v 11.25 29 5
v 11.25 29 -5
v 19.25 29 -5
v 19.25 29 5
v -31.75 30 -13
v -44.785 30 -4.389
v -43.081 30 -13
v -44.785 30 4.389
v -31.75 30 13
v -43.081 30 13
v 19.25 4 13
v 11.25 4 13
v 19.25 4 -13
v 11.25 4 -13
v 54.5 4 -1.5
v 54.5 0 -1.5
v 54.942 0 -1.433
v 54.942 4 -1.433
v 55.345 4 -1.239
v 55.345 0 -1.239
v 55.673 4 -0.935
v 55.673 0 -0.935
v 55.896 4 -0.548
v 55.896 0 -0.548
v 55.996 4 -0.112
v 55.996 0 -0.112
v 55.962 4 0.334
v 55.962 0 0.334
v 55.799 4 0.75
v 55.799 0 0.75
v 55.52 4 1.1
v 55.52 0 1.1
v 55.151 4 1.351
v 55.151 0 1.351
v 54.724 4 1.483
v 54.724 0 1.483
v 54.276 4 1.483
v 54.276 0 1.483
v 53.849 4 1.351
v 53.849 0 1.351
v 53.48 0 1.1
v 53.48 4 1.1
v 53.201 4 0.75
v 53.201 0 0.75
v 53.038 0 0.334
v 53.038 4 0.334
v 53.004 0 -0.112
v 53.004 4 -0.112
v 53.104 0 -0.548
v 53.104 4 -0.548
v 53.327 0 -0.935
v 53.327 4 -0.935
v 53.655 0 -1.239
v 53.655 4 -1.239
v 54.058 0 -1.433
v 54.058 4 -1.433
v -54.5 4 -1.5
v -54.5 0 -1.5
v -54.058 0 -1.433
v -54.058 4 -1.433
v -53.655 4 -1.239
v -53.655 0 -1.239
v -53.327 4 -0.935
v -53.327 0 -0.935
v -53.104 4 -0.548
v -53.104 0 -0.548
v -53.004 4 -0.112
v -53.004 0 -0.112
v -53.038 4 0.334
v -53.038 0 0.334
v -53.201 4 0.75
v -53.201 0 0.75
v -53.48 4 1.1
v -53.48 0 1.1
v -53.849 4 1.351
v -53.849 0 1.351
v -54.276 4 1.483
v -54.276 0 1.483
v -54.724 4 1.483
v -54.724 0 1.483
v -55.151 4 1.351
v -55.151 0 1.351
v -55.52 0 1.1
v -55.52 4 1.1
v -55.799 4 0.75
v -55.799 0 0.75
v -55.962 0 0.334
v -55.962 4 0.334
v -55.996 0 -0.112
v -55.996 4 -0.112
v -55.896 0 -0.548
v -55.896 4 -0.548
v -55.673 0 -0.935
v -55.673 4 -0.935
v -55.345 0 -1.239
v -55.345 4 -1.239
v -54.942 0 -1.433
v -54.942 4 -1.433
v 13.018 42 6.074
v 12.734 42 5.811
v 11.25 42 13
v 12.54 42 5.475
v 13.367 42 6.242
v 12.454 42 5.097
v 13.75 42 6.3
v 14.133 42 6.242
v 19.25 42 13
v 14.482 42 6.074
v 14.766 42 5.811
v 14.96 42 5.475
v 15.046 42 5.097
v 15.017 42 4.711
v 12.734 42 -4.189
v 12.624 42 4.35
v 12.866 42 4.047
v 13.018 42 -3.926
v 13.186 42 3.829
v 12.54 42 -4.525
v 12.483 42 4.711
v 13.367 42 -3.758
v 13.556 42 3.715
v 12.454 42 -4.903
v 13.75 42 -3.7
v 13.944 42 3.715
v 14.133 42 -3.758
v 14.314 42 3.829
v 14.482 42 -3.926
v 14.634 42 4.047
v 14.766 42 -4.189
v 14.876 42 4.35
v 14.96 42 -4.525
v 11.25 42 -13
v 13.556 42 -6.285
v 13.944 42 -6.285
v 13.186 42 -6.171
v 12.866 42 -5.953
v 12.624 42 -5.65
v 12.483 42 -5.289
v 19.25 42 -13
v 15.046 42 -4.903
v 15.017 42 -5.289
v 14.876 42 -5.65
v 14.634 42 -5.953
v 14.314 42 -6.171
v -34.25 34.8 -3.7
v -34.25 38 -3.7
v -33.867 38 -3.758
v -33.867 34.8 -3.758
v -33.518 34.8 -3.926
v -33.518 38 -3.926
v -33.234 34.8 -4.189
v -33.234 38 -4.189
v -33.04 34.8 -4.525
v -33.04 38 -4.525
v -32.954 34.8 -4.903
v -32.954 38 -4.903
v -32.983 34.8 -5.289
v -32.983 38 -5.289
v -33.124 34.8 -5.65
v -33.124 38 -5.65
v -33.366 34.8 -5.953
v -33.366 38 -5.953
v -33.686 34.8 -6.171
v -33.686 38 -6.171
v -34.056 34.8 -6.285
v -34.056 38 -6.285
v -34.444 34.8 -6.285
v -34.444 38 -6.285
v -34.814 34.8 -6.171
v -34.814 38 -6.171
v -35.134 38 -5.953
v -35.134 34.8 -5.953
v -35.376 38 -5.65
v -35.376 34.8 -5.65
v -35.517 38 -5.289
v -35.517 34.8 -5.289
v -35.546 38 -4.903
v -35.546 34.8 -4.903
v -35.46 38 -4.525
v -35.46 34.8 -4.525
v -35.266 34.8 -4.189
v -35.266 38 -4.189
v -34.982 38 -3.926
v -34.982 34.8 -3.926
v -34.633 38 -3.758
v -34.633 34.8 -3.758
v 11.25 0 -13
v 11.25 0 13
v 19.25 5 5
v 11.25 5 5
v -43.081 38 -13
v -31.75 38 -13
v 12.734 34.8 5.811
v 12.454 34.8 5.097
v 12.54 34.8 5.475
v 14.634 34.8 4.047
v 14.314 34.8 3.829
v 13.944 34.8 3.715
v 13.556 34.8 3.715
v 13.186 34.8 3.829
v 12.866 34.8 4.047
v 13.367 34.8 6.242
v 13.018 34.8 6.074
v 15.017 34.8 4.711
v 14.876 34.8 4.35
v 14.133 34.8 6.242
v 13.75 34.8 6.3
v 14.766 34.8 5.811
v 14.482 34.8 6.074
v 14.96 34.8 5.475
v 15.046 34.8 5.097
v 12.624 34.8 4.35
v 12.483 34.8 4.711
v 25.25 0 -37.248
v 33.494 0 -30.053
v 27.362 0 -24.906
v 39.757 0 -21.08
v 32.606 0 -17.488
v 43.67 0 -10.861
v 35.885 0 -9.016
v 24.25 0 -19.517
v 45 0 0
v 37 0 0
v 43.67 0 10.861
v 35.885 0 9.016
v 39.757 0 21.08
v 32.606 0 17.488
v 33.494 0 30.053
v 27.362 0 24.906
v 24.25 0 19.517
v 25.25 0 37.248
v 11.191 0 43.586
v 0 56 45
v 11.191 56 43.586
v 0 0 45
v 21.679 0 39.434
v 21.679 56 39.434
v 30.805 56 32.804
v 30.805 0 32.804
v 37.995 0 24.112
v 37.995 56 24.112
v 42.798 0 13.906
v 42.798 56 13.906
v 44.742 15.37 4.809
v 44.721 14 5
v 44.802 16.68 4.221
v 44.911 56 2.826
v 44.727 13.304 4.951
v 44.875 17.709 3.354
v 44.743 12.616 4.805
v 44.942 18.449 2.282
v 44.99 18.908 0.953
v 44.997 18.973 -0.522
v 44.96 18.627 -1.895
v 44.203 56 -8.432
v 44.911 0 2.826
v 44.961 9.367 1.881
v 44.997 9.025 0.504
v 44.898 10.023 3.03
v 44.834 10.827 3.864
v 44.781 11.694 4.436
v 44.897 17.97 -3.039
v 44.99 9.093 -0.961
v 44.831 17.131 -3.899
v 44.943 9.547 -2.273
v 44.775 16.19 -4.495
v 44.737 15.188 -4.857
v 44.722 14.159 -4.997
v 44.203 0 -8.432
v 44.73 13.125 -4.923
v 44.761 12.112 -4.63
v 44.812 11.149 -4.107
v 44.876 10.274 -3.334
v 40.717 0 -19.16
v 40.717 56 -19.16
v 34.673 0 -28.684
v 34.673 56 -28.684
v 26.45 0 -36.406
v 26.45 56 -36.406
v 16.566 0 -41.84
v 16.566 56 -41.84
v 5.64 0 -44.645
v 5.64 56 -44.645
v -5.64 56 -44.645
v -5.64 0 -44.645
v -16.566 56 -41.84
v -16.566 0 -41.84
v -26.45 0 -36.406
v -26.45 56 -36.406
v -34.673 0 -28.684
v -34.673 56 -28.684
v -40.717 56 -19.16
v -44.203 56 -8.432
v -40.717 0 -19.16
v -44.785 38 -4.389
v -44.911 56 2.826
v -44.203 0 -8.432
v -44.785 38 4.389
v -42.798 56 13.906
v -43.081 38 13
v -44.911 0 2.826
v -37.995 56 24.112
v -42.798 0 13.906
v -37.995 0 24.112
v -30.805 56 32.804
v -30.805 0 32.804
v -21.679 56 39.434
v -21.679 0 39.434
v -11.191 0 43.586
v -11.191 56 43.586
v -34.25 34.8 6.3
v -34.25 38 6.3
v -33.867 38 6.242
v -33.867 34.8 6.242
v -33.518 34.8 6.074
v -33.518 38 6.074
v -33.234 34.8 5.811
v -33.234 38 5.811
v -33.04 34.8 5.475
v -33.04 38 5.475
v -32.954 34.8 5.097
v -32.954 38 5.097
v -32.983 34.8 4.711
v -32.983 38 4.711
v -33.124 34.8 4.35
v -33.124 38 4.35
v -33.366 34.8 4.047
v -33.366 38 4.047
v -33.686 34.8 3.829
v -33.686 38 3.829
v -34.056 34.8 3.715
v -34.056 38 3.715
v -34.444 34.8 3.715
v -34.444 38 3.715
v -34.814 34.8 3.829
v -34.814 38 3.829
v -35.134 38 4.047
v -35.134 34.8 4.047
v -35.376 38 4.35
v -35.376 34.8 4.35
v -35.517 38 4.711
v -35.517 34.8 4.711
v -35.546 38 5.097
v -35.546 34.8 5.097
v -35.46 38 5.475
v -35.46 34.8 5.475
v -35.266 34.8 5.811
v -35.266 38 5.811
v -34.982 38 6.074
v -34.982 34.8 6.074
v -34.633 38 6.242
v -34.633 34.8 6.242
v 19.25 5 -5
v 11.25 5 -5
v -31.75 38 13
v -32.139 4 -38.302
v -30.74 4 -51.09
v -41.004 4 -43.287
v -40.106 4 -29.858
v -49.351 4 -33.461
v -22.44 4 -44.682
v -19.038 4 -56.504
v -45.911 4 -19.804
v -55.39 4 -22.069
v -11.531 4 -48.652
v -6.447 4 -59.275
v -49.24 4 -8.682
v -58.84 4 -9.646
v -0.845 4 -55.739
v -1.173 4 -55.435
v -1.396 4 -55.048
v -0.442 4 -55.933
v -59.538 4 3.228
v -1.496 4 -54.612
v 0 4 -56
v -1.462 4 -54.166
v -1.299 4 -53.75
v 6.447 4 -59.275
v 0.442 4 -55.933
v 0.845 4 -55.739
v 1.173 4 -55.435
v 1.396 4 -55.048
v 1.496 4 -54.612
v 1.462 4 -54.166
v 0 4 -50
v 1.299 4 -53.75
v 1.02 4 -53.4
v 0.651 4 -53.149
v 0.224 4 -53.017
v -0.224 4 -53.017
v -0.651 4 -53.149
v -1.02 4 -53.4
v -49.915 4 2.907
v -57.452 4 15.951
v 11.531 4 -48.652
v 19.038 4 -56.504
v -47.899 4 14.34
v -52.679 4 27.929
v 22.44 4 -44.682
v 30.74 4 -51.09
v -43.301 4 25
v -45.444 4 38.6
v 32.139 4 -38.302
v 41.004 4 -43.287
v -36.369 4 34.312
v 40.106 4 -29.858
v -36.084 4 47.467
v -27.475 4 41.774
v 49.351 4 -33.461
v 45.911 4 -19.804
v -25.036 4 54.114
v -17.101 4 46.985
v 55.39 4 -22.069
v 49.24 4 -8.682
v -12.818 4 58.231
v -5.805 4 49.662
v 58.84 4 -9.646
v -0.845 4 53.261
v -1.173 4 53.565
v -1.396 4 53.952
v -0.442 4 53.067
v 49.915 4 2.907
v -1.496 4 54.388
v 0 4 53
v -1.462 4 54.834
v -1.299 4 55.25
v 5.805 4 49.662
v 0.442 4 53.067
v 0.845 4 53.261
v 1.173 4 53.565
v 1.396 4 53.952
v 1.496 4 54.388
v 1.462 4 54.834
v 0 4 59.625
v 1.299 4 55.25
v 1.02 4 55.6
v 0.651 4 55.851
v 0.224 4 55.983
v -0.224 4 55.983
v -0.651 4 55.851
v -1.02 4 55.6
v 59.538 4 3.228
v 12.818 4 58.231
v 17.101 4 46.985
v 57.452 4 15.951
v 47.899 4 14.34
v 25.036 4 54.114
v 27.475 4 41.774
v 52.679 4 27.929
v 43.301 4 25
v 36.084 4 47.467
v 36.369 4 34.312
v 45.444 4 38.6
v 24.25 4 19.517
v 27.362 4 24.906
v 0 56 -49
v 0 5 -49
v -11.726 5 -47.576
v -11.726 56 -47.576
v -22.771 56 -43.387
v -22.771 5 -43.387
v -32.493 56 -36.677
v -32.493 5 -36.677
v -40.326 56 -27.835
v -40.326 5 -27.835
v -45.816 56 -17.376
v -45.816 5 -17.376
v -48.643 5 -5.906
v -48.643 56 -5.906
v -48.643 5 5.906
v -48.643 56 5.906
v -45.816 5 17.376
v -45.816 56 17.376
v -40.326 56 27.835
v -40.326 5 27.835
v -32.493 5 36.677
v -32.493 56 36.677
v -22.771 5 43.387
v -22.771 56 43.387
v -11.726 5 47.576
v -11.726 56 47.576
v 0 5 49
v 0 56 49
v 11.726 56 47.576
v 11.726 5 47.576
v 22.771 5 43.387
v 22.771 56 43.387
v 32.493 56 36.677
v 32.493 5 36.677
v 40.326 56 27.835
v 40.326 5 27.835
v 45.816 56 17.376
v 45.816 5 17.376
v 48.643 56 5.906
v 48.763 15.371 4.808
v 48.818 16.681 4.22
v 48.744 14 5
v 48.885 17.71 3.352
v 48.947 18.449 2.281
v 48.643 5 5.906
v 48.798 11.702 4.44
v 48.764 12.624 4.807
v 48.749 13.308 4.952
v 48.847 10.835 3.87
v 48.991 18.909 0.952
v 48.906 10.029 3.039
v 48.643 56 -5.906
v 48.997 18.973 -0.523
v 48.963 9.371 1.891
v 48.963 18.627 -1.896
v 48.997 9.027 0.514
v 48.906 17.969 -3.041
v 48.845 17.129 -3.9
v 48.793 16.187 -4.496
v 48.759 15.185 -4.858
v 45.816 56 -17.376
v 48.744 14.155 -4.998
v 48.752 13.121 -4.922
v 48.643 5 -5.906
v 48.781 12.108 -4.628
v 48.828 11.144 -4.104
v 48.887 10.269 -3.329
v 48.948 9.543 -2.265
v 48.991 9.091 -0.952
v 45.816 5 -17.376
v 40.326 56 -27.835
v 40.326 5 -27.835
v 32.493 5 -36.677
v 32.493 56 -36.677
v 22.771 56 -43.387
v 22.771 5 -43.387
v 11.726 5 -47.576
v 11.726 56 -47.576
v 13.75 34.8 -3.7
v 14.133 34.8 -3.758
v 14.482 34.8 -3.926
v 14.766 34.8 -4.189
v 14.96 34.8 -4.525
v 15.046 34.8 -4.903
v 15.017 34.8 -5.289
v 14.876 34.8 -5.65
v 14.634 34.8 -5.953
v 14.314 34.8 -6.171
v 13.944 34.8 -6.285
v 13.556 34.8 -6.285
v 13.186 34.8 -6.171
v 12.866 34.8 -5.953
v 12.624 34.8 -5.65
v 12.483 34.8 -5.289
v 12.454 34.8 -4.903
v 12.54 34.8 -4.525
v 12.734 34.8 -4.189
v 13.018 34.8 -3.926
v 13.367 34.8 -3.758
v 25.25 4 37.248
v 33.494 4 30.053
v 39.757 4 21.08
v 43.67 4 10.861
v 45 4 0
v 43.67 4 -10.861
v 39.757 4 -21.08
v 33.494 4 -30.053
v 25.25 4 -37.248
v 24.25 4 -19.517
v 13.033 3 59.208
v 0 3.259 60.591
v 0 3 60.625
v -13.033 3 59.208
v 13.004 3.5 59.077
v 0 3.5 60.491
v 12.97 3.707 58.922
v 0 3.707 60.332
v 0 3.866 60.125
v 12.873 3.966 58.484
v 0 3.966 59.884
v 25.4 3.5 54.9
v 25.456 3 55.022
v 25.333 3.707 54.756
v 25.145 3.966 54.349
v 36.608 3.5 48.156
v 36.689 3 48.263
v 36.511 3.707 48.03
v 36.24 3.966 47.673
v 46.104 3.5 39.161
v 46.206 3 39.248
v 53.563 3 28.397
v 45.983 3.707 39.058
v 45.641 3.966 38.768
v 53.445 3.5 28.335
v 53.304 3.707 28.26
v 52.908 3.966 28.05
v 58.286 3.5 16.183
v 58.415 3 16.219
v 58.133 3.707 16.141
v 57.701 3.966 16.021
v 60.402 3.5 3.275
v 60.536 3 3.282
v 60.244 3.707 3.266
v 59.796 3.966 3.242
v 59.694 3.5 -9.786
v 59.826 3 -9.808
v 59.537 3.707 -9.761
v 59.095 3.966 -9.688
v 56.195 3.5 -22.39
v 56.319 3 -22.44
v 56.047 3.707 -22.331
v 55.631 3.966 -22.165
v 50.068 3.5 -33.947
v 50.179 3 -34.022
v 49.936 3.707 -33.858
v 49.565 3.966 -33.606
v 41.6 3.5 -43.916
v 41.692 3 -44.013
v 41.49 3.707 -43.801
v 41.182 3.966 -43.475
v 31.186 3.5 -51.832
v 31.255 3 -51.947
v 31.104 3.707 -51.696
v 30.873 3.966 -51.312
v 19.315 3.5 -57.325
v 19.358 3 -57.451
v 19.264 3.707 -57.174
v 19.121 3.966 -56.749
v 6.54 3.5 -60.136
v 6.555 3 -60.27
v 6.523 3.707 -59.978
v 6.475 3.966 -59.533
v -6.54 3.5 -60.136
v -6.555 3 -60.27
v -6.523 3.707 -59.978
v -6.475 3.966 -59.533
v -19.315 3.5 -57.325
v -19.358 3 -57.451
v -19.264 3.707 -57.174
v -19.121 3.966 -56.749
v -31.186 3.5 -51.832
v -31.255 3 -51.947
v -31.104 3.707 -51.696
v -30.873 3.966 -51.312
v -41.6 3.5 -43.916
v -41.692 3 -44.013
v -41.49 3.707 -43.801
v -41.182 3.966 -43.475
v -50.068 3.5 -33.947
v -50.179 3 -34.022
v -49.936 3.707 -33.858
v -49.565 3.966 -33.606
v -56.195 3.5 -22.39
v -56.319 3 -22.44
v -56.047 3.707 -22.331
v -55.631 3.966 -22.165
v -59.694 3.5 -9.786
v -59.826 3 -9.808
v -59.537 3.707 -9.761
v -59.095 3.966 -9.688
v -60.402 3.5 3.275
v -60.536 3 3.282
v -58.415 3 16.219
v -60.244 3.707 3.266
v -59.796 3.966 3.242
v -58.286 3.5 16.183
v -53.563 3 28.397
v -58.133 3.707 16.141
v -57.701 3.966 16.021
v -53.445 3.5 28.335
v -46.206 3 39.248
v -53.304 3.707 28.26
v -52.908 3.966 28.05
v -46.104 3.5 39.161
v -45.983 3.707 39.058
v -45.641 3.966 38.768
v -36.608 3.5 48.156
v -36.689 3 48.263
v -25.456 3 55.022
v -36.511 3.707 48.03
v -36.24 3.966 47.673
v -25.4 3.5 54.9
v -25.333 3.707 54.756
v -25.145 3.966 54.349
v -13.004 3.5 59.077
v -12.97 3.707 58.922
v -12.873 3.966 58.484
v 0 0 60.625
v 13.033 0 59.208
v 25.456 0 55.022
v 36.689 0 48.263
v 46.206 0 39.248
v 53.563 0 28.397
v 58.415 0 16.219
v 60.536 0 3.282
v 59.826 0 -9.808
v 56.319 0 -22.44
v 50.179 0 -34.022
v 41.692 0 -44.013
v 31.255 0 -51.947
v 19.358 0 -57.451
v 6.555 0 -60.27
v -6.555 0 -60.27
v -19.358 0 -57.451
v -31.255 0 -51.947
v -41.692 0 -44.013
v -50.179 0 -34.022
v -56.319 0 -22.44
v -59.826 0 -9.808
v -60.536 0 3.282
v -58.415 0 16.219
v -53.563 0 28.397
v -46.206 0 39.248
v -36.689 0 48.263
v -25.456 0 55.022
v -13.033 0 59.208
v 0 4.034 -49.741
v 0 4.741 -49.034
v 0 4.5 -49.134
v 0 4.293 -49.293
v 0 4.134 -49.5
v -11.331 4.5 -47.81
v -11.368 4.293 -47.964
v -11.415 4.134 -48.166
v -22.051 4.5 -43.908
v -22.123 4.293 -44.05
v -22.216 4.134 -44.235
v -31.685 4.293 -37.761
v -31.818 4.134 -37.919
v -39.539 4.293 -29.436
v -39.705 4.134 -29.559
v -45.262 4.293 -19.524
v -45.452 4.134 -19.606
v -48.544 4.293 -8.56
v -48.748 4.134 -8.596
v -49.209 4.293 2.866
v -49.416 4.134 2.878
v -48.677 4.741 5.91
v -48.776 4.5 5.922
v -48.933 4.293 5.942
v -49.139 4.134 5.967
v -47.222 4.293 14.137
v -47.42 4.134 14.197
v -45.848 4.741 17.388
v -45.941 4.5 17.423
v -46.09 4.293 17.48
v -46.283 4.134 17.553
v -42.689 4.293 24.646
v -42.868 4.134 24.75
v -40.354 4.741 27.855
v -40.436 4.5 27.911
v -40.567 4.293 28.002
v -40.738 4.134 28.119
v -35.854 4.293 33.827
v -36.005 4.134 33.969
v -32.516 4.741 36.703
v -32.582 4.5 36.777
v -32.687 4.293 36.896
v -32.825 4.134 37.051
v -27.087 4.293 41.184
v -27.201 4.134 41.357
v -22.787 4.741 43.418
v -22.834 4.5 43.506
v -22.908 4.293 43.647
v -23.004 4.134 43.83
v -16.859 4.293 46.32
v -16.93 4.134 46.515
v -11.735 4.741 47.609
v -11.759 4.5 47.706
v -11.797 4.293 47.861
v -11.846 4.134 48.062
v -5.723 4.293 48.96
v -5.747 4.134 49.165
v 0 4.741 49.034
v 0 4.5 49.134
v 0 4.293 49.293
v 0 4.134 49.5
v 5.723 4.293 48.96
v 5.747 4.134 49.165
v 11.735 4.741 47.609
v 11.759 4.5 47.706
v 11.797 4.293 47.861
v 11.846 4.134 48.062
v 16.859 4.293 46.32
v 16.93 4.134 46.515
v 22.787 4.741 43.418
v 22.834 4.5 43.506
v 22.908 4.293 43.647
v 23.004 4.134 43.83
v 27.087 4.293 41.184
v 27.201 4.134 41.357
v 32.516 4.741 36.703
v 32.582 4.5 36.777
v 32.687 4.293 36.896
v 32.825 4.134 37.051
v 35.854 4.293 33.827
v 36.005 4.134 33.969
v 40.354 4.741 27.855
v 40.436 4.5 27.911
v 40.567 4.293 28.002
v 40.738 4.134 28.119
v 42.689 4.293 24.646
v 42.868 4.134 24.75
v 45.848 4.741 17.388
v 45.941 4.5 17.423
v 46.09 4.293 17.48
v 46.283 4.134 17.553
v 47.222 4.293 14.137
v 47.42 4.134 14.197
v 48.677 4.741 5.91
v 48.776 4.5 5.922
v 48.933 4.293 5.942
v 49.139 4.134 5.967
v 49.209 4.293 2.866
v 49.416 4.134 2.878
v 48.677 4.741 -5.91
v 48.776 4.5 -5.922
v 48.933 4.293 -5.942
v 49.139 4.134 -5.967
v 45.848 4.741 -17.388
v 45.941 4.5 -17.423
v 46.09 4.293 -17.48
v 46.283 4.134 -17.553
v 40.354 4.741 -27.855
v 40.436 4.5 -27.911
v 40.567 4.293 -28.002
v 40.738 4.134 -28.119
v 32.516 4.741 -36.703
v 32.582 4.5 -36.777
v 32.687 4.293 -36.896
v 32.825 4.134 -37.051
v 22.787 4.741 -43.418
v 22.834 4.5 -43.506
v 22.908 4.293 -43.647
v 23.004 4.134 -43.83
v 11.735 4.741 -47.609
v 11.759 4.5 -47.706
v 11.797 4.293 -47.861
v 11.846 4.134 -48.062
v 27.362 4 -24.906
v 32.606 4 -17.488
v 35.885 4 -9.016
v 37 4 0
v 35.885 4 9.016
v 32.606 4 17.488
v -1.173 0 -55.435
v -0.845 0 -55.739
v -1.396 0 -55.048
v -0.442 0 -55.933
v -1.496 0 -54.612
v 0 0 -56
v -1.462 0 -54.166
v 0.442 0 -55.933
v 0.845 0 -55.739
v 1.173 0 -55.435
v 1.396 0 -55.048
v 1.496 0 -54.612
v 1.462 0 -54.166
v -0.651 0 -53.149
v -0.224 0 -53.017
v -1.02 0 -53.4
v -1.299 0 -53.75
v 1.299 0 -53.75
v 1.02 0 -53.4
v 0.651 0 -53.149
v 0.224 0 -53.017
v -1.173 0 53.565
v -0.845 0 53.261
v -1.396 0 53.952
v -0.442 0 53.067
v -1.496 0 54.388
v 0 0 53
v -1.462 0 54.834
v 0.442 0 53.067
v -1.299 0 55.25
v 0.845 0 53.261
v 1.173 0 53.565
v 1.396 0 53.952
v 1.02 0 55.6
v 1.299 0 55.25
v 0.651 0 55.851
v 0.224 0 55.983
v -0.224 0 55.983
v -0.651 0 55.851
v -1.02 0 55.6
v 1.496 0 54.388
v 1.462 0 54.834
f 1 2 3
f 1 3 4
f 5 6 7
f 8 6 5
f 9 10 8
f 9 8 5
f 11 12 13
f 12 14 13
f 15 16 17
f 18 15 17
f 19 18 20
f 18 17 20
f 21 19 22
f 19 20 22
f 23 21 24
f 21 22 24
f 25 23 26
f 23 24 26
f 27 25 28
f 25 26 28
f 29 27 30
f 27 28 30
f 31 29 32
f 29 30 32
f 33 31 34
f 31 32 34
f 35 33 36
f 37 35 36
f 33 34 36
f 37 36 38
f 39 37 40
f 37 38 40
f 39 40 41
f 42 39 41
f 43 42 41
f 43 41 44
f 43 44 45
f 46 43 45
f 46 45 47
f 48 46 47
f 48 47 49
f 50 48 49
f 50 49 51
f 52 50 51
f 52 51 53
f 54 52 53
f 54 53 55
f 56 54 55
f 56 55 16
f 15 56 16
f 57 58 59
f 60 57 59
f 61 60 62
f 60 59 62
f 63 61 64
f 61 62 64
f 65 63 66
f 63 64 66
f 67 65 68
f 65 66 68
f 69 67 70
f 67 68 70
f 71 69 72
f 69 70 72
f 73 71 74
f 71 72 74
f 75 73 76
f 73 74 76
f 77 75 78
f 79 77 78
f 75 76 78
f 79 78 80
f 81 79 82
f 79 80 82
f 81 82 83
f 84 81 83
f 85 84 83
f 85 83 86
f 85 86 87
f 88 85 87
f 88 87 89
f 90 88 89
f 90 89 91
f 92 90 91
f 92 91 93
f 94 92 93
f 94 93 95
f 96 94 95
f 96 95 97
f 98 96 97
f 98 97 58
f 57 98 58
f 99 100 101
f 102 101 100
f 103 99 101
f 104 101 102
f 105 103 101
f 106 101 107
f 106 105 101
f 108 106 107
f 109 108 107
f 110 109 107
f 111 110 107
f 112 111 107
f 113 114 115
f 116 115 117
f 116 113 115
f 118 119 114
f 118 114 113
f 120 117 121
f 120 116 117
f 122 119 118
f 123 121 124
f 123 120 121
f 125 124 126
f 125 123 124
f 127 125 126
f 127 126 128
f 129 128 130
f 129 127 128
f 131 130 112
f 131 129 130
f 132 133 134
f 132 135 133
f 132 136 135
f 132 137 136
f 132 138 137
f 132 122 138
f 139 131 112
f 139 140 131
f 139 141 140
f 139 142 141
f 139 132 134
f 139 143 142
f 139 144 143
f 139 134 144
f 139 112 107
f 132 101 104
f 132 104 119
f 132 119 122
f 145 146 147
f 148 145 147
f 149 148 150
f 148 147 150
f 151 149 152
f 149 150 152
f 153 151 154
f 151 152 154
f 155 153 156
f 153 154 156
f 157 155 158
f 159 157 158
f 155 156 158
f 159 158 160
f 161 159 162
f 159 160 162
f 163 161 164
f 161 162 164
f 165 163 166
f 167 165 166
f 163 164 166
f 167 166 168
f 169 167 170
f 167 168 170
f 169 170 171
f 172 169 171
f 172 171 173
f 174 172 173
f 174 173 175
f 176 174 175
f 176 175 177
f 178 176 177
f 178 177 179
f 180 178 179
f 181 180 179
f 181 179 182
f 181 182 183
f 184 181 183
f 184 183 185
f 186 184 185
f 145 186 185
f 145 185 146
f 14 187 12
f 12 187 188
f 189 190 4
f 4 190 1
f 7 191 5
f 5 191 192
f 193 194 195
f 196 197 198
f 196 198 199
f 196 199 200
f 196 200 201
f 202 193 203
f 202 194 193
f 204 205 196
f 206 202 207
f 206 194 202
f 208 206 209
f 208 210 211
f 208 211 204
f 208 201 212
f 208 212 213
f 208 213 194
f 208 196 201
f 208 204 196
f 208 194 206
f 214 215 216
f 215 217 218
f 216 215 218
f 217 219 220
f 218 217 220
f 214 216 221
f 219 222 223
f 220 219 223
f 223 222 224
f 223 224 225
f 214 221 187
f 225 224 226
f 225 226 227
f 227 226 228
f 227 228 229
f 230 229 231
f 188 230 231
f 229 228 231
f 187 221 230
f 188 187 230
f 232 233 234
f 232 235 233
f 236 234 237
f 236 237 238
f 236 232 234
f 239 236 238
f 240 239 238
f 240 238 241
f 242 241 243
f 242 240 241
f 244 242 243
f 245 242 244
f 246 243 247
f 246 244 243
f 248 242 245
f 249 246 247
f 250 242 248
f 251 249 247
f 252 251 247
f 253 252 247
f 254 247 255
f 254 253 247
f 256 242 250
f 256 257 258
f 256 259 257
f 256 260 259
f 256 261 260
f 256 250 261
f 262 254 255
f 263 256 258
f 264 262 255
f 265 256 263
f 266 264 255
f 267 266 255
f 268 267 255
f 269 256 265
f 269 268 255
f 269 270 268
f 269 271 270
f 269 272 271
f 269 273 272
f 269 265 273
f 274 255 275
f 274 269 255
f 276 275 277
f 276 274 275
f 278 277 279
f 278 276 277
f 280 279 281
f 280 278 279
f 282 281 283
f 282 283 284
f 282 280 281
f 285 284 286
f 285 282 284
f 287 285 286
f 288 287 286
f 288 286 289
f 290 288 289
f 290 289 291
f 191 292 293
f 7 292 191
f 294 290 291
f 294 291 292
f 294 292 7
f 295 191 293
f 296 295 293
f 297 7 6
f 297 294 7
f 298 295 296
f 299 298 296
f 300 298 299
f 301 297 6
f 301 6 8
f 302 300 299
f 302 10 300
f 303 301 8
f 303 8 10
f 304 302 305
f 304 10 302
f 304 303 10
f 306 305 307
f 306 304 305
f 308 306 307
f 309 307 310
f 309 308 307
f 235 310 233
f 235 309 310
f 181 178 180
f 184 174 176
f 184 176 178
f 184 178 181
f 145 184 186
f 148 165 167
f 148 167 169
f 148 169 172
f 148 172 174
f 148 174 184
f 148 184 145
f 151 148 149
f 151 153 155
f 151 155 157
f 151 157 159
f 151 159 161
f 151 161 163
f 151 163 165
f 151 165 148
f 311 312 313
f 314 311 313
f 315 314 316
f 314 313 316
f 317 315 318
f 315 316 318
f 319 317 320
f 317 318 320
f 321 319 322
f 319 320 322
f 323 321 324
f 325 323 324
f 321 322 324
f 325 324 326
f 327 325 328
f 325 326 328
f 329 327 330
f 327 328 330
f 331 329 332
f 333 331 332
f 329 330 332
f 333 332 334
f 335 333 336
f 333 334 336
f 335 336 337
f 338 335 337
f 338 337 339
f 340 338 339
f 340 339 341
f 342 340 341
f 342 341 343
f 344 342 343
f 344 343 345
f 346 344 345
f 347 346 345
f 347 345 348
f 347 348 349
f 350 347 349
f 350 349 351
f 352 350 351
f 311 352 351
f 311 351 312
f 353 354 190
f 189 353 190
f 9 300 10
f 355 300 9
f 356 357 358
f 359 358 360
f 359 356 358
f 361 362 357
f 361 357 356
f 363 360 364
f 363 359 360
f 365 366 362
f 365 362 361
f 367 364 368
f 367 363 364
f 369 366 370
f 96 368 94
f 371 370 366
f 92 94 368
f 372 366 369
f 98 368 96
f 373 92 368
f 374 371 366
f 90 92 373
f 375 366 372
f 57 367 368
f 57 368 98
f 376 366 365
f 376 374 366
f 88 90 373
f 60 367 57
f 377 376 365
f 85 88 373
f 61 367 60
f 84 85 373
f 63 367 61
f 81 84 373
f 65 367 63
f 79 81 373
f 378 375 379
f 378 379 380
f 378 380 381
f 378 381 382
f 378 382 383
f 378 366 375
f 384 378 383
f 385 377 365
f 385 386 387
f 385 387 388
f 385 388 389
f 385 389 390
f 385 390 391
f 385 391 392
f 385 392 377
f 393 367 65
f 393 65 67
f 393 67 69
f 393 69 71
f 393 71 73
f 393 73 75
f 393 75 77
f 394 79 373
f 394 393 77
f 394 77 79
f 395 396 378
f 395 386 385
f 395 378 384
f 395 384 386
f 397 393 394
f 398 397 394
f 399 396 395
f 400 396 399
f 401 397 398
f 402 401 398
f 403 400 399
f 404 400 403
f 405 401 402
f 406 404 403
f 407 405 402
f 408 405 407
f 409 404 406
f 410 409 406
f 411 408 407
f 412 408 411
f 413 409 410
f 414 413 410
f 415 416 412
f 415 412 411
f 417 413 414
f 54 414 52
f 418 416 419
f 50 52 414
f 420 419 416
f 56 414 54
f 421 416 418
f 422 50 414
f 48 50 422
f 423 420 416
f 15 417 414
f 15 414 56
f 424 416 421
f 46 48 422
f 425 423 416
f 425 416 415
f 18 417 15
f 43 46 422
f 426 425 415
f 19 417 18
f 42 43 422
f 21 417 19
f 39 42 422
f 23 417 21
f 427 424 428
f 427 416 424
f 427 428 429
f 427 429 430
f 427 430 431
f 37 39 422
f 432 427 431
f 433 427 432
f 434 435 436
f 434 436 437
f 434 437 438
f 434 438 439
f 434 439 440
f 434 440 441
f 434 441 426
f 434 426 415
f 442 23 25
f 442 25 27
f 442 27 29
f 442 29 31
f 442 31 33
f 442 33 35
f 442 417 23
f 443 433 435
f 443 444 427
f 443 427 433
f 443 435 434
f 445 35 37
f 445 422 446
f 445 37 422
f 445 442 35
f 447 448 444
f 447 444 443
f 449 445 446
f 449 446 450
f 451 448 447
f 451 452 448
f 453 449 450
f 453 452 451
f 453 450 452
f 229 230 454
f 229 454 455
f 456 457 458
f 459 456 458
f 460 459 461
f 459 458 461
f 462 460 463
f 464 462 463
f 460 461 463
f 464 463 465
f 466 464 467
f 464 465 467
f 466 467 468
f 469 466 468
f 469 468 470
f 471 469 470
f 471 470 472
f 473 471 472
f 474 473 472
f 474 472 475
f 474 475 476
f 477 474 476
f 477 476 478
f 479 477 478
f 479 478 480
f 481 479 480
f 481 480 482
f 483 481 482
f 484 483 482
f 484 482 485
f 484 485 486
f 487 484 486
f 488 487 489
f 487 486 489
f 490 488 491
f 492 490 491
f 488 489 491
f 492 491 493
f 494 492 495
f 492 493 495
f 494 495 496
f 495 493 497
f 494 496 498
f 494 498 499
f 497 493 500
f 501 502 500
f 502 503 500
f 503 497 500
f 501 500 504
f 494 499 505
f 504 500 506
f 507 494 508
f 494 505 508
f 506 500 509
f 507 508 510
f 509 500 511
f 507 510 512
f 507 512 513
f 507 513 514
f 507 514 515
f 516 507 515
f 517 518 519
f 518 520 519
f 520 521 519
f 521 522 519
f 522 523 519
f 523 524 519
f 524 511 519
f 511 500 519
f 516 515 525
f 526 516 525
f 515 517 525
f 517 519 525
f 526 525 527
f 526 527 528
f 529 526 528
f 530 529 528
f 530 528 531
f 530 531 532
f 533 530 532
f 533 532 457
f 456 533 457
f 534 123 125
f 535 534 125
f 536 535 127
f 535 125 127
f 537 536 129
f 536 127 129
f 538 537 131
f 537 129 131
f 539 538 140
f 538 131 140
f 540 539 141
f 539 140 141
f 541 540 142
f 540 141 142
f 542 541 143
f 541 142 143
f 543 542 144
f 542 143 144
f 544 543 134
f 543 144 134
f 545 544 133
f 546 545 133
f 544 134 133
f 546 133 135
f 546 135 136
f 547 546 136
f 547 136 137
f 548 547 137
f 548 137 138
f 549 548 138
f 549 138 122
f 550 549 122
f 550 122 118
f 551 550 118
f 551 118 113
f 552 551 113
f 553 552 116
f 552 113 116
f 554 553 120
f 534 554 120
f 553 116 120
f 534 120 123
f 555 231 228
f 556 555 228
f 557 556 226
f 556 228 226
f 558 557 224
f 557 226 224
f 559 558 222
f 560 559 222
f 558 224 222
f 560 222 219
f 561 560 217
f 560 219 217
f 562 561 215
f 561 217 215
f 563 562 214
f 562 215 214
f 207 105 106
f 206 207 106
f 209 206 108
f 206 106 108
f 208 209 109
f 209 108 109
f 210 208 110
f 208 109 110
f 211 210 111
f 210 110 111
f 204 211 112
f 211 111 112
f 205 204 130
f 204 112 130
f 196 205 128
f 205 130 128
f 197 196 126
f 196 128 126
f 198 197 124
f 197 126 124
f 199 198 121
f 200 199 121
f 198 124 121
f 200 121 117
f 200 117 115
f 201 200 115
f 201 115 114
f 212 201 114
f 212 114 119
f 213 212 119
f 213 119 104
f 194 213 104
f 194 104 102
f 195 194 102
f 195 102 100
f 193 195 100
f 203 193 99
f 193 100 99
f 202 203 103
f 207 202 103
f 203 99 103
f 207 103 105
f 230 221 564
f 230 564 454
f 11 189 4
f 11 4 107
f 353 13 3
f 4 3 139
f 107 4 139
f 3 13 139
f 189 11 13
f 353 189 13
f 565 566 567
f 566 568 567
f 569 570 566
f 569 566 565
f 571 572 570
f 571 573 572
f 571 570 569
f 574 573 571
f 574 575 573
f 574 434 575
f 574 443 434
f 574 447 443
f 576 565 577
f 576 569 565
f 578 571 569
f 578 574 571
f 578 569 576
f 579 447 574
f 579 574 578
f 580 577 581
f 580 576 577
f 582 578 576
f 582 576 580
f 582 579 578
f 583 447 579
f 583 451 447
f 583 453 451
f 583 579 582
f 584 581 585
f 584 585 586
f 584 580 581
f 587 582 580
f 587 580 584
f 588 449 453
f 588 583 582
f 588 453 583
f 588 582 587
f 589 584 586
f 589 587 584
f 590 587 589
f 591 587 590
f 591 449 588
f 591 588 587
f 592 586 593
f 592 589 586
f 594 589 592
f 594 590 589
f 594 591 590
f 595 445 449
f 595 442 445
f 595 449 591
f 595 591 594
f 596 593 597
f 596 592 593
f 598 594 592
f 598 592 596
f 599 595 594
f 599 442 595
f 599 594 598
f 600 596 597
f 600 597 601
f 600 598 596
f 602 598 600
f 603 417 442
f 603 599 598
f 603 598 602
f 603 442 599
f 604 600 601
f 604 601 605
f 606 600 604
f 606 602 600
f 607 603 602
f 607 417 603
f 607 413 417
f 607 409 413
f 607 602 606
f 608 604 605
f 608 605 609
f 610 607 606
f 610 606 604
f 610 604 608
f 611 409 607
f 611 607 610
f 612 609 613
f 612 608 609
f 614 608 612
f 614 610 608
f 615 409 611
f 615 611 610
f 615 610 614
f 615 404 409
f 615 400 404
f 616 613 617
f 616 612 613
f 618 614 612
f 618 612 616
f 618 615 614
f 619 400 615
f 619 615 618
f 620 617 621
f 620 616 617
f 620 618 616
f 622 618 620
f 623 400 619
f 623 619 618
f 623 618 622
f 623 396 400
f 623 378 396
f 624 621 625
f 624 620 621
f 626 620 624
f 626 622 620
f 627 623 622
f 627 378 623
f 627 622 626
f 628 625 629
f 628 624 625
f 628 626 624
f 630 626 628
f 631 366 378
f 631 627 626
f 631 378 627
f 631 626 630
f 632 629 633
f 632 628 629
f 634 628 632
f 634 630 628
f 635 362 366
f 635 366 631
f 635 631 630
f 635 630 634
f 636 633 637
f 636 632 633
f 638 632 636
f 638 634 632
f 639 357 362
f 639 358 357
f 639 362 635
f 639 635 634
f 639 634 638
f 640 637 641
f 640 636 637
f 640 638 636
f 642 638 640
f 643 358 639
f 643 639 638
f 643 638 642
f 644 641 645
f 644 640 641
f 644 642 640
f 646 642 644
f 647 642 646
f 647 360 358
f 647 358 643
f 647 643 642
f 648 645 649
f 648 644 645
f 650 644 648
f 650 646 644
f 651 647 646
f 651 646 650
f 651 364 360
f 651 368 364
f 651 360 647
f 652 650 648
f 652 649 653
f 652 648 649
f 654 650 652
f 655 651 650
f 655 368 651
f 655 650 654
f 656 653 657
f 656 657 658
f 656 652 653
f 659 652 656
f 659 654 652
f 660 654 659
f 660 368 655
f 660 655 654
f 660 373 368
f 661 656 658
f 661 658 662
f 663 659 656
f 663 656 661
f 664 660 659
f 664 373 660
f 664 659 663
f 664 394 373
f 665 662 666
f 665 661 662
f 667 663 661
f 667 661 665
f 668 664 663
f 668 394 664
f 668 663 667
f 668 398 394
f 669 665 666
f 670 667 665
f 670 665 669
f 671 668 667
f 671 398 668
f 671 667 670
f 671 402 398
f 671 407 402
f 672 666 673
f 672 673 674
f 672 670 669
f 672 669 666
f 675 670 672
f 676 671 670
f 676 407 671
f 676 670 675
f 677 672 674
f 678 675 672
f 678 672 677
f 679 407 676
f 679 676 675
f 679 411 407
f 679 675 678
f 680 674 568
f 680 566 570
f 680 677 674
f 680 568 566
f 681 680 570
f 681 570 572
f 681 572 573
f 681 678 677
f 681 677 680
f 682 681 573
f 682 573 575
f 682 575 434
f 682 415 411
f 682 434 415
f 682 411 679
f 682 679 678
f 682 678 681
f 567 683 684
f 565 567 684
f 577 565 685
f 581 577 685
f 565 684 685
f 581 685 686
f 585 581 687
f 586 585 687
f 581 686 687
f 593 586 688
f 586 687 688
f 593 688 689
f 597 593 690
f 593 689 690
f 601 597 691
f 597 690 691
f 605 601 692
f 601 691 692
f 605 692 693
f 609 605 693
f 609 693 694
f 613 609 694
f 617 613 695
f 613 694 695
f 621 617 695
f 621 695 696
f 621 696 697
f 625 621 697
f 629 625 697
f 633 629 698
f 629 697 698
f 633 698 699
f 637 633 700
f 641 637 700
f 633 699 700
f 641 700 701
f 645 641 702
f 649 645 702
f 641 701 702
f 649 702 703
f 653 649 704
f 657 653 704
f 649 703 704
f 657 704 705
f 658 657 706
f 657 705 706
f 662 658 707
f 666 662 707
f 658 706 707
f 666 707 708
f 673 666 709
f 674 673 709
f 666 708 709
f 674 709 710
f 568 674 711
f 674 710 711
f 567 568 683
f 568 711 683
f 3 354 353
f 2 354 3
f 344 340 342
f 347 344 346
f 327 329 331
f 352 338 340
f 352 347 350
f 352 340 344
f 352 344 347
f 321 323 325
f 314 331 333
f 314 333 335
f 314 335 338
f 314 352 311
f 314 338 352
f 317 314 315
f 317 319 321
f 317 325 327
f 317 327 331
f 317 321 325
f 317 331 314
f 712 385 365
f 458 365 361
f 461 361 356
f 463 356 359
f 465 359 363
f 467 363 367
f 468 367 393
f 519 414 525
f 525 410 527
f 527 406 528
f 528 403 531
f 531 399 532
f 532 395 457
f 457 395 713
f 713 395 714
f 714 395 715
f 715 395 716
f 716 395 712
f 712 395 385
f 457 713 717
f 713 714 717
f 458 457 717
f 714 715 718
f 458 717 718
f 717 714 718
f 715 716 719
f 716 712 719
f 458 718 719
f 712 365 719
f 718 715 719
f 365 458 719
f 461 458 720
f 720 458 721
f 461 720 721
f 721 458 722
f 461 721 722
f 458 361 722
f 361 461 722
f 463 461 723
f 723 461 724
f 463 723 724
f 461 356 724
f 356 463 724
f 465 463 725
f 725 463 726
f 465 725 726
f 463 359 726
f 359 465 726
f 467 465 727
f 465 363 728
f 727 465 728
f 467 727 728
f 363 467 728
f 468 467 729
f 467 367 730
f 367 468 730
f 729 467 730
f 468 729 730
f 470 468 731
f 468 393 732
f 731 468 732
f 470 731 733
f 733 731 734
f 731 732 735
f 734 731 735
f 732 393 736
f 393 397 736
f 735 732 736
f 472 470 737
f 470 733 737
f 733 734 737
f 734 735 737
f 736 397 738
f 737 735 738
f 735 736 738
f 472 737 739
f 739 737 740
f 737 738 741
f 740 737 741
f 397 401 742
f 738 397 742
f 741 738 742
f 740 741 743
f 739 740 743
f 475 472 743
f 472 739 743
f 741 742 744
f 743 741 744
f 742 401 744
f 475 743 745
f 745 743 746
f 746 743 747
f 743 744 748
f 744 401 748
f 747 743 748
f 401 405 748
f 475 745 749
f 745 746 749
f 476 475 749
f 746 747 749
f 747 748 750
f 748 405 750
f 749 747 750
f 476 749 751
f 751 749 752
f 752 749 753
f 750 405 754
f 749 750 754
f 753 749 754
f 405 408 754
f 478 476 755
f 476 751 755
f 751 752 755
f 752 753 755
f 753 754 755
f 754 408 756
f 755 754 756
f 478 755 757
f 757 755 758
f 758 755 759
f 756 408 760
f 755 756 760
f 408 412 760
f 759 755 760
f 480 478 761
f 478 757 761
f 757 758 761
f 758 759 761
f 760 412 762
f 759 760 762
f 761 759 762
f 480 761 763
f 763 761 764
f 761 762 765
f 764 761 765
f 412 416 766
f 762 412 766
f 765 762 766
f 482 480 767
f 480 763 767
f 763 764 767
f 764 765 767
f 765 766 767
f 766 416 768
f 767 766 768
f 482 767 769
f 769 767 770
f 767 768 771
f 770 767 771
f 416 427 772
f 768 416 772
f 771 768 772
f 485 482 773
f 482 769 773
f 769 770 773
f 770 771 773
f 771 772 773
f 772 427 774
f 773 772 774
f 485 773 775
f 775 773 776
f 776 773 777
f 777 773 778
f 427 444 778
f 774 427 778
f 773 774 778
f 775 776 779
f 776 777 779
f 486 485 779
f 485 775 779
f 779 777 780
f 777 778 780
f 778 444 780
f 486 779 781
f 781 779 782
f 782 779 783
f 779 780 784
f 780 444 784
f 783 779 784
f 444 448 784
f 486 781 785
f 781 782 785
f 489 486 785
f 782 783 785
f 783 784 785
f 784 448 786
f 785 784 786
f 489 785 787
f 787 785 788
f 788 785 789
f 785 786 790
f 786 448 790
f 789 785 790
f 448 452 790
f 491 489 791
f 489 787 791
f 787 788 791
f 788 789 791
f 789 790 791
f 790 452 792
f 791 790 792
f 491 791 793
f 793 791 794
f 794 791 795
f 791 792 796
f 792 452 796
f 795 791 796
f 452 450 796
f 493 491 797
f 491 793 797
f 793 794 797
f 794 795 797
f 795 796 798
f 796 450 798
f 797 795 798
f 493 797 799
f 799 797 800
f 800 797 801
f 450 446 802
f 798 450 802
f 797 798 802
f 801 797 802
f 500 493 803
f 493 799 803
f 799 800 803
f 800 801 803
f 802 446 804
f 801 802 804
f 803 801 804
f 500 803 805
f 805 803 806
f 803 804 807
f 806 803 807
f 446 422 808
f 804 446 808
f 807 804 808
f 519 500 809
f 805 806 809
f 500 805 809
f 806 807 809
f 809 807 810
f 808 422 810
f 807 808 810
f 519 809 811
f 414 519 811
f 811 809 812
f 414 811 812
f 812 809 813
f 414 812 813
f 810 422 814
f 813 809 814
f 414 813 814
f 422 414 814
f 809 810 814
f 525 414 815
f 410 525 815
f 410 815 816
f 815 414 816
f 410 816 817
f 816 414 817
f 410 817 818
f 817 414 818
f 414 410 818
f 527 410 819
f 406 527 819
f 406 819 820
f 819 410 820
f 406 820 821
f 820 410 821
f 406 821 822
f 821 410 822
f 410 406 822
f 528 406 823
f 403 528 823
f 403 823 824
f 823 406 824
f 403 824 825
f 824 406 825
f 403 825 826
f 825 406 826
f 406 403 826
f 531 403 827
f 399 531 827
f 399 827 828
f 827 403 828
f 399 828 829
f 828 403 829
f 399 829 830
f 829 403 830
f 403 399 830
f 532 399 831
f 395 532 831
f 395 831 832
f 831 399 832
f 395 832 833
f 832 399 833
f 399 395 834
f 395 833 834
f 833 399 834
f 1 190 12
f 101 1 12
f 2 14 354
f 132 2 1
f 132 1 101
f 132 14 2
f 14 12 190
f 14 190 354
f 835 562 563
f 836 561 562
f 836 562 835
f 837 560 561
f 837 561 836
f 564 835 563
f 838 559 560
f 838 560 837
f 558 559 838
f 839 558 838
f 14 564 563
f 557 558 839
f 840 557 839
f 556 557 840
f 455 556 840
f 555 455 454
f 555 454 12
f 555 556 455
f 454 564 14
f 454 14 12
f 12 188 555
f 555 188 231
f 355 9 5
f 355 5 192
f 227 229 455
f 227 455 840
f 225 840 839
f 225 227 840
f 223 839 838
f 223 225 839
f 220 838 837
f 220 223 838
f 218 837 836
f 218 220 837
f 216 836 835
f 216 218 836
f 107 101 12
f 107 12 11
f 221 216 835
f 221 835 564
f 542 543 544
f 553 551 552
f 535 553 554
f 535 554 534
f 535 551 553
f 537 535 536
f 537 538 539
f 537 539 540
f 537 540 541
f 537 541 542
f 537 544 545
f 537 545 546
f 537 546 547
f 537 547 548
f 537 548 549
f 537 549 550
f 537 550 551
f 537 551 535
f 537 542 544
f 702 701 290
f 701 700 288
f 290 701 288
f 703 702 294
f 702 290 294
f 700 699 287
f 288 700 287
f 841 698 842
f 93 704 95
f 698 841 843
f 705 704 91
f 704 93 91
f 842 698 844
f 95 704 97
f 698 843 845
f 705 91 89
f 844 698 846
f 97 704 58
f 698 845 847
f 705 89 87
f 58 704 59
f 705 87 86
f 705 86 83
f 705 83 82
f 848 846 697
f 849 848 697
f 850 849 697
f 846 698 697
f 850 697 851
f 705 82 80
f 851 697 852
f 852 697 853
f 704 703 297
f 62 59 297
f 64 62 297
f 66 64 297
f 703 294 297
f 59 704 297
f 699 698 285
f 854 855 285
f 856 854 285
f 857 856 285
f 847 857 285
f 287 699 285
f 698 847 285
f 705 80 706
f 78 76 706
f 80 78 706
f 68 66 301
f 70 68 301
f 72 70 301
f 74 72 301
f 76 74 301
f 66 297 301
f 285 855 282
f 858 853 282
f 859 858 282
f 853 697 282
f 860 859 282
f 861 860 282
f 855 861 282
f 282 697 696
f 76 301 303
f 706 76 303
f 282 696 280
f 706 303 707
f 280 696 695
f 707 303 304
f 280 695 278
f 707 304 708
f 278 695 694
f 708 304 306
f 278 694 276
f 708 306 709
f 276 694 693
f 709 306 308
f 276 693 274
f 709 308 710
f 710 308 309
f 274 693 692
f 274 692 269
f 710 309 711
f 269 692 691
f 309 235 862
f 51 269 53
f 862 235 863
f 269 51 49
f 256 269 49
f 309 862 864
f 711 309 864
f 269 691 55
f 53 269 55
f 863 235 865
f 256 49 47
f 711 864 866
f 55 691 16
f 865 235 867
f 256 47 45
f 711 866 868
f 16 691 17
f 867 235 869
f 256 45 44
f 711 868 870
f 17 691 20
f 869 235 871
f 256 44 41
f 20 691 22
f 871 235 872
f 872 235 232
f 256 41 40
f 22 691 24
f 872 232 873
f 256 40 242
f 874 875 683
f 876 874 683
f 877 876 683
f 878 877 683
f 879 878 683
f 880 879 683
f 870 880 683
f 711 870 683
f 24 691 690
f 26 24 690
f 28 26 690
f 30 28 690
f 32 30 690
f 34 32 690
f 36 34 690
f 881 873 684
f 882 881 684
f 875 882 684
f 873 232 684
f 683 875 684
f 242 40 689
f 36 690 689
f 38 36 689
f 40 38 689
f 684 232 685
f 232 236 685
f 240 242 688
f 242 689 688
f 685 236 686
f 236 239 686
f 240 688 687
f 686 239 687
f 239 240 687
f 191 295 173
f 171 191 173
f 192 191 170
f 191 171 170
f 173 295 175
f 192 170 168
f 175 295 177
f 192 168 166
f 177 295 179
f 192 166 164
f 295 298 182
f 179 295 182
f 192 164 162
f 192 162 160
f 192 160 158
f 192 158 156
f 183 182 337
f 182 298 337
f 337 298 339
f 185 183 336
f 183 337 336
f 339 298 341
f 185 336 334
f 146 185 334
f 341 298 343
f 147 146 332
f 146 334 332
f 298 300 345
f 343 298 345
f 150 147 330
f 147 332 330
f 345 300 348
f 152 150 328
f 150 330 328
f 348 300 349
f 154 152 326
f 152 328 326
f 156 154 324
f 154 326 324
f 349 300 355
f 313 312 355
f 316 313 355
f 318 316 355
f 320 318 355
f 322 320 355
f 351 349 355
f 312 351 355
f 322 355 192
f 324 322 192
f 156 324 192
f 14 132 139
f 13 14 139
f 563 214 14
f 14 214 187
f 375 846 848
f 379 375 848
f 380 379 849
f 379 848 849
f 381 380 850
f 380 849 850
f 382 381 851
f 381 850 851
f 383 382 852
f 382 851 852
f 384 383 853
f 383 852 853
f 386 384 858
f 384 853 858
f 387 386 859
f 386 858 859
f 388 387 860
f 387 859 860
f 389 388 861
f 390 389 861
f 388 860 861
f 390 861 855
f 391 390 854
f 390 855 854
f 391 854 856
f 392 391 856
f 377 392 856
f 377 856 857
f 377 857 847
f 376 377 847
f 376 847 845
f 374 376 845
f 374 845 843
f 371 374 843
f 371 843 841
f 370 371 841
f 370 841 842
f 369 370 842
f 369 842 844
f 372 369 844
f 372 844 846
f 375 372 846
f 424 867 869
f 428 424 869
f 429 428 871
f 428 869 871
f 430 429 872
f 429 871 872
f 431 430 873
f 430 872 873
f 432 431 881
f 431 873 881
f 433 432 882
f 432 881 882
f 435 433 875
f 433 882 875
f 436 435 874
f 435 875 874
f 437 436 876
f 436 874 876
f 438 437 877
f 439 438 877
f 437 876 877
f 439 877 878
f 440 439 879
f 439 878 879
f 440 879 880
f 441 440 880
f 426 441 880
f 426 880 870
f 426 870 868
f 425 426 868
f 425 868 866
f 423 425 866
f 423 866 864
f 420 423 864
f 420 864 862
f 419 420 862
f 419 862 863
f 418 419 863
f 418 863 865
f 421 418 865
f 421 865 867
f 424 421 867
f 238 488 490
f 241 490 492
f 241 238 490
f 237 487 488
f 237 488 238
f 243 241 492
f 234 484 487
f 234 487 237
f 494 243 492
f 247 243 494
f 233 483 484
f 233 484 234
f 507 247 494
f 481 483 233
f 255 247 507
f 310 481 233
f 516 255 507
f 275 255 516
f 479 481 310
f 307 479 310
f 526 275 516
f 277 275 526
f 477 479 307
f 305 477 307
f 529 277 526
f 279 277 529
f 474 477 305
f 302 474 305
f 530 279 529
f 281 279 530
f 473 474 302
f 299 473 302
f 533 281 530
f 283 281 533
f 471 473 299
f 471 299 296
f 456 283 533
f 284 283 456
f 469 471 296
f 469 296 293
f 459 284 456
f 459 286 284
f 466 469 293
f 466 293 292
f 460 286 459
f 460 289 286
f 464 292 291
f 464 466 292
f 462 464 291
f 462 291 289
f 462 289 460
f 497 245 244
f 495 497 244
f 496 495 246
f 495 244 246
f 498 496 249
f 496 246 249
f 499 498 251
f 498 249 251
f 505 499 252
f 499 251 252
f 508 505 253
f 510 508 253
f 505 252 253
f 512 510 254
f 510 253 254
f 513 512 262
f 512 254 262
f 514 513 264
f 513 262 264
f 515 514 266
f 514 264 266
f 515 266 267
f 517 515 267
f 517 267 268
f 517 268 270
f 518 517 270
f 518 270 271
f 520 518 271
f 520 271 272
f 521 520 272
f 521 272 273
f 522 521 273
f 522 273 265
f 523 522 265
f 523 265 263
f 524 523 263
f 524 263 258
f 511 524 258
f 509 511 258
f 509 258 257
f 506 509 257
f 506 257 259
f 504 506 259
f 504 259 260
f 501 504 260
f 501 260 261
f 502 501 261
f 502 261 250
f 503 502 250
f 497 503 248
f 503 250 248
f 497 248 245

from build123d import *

# Parameters (mm, degrees)
SKETCH1_R           = 60.625
SKETCH1_R_2         = 45
BOSS_EXTRUDE1_DEPTH = 4
SKETCH2_R           = 49
SKETCH2_R_2         = 45
BOSS_EXTRUDE2_DEPTH = 52
SKETCH3_W           = 8
SKETCH3_H           = 38
SKETCH3_W_2         = 15
SKETCH3_H_2         = 8
BOSS_EXTRUDE3_DEPTH = 13
SKETCH4_W           = 10
SKETCH4_H           = 24
CUT_EXTRUDE1_DEPTH  = 8
SKETCH5_R           = 5
CUT_EXTRUDE2_DEPTH  = 110.441337026
SKETCH6_R           = 1.3
CUT_EXTRUDE3_DEPTH  = 7.2
BOSS_EXTRUDE4_DEPTH = 4
SKETCH8_R           = 1.5
CUT_EXTRUDE4_DEPTH  = 103.404986506
FILLET1_R           = 1


with BuildPart() as part:
    # Sketch1 → Boss-Extrude1 (new body)
    with BuildSketch(Plane(origin=(0, 0, 0), x_dir=(1, 0, 0), z_dir=(0, 1, 0))):
        with Locations(Location((0, 0, 0), (0, 0, 270))):
            Circle(SKETCH1_R)
        with Locations(Location((0, 0, 0), (0, 0, 270))):
            Circle(SKETCH1_R_2, mode=Mode.SUBTRACT)
    extrude(amount=BOSS_EXTRUDE1_DEPTH)

    # Sketch2 → Boss-Extrude2 (add)
    with BuildSketch(Plane(origin=(0, 4, 0), x_dir=(1, 0, 0), z_dir=(0, 1, 0))):
        with Locations(Location((0, 0, 0), (0, 0, 90))):
            Circle(SKETCH2_R)
        with Locations(Location((0, 0, 0), (0, 0, 270))):
            Circle(SKETCH2_R_2, mode=Mode.SUBTRACT)
    extrude(amount=BOSS_EXTRUDE2_DEPTH)

    # Sketch3 → Boss-Extrude3 (add, symmetric)
    with BuildSketch(Plane.XY):
        with Locations((15.25, 23)):
            Rectangle(SKETCH3_W, SKETCH3_H)
        with Locations((-39.25, 34)):
            Rectangle(SKETCH3_W_2, SKETCH3_H_2)
    extrude(amount=BOSS_EXTRUDE3_DEPTH, both=True)


with BuildPart() as boss_extrude3_piece_1:
    # of the separate pieces the step leaves, piece 1, a body of its own (boss_extrude3_pieces)
    add(part.part.solids().sort_by_distance((0, 0, 60.625))[0])

    # Sketch5 → Cut-Extrude2 (cut, through all)
    with BuildSketch(Plane.ZY.offset(-11.25)):
        with Locations((0, 14)):
            Circle(SKETCH5_R)
    extrude(amount=-CUT_EXTRUDE2_DEPTH, mode=Mode.SUBTRACT)


with BuildPart() as boss_extrude3_piece_2:
    # of the separate pieces the step leaves, piece 2, a body of its own (boss_extrude3_pieces)
    add(part.part.solids().sort_by_distance((19.25, 4, -13))[0])

    # Sketch4 → Cut-Extrude1 (cut)
    with BuildSketch(Plane.ZY.offset(-11.25)):
        with Locations((0, 17)):
            Rectangle(SKETCH4_W, SKETCH4_H)
    extrude(amount=-CUT_EXTRUDE1_DEPTH, mode=Mode.SUBTRACT)


with BuildPart() as cut_extrude3_tool:
    # Sketch6 → Cut-Extrude3 (new body)
    with BuildSketch(Plane(origin=(0, 42, 0), x_dir=(1, 0, 0), z_dir=(0, 1, 0))):
        with Locations(Location((-34.25, 5, 0), (0, 0, 270))):
            Circle(SKETCH6_R)
        with Locations(Location((-34.25, -5, 0), (0, 0, 270))):
            Circle(SKETCH6_R)
        with Locations(Location((13.75, -5, 0), (0, 0, 270))):
            Circle(SKETCH6_R)
        with Locations(Location((13.75, 5, 0), (0, 0, 270))):
            Circle(SKETCH6_R)
    extrude(amount=-CUT_EXTRUDE3_DEPTH)


with BuildPart() as boss_extrude3_piece_1_1:
    add(boss_extrude3_piece_1.part)

    # Cut-Extrude3: cut by cut_extrude3_tool
    add(cut_extrude3_tool.part, mode=Mode.SUBTRACT)

    # Sketch8 → Cut-Extrude4 (cut, through all)
    with BuildSketch(Plane.XZ):
        with Locations(Location((54.5, 0, 0), (0, 0, 270))):
            Circle(SKETCH8_R)
        with Locations(Location((0, -54.5, 0), (0, 0, 270))):
            Circle(SKETCH8_R)
        with Locations(Location((-54.5, 0, 0), (0, 0, 270))):
            Circle(SKETCH8_R)
        with Locations(Location((0, 54.5, 0), (0, 0, 270))):
            Circle(SKETCH8_R)
    extrude(amount=-CUT_EXTRUDE4_DEPTH, mode=Mode.SUBTRACT)

    # Fillet1
    fillet1_edges = [boss_extrude3_piece_1_1.edges().sort_by_distance(p)[0] for p in [
        (0, 4, 49),
        (0, 4, -60.625),
    ]]
    fillet(fillet1_edges, radius=FILLET1_R)


with BuildPart() as boss_extrude3_piece_2_1:
    add(boss_extrude3_piece_2.part)

    # Cut-Extrude3: cut by cut_extrude3_tool
    add(cut_extrude3_tool.part, mode=Mode.SUBTRACT)


with BuildPart() as body_3:
    # Sketch7 → Boss-Extrude4 (new body)
    with BuildSketch(Plane.XZ):
        with BuildLine():
            Line((11.25, 13), (25.249838503, 37.248431585))
            ThreePointArc((25.249838503, 37.248431585), (45, 0), (25.249838503, -37.248431585))
            Line((25.249838503, -37.248431585), (11.25, -13))
            Line((11.25, -13), (11.25, 13))
        make_face()
        with BuildLine():
            Line((24.25, 19.516660498), (27.361802413, 24.906460381))
            ThreePointArc((27.361802413, 24.906460381), (37, 0), (27.361802413, -24.906460381))
            Line((27.361802413, -24.906460381), (24.25, -19.516660498))
            Line((24.25, -19.516660498), (24.25, 19.516660498))
        make_face(mode=Mode.SUBTRACT)
    extrude(amount=-BOSS_EXTRUDE4_DEPTH)


solid = Compound([boss_extrude3_piece_1_1.part, boss_extrude3_piece_2_1.part, body_3.part])
